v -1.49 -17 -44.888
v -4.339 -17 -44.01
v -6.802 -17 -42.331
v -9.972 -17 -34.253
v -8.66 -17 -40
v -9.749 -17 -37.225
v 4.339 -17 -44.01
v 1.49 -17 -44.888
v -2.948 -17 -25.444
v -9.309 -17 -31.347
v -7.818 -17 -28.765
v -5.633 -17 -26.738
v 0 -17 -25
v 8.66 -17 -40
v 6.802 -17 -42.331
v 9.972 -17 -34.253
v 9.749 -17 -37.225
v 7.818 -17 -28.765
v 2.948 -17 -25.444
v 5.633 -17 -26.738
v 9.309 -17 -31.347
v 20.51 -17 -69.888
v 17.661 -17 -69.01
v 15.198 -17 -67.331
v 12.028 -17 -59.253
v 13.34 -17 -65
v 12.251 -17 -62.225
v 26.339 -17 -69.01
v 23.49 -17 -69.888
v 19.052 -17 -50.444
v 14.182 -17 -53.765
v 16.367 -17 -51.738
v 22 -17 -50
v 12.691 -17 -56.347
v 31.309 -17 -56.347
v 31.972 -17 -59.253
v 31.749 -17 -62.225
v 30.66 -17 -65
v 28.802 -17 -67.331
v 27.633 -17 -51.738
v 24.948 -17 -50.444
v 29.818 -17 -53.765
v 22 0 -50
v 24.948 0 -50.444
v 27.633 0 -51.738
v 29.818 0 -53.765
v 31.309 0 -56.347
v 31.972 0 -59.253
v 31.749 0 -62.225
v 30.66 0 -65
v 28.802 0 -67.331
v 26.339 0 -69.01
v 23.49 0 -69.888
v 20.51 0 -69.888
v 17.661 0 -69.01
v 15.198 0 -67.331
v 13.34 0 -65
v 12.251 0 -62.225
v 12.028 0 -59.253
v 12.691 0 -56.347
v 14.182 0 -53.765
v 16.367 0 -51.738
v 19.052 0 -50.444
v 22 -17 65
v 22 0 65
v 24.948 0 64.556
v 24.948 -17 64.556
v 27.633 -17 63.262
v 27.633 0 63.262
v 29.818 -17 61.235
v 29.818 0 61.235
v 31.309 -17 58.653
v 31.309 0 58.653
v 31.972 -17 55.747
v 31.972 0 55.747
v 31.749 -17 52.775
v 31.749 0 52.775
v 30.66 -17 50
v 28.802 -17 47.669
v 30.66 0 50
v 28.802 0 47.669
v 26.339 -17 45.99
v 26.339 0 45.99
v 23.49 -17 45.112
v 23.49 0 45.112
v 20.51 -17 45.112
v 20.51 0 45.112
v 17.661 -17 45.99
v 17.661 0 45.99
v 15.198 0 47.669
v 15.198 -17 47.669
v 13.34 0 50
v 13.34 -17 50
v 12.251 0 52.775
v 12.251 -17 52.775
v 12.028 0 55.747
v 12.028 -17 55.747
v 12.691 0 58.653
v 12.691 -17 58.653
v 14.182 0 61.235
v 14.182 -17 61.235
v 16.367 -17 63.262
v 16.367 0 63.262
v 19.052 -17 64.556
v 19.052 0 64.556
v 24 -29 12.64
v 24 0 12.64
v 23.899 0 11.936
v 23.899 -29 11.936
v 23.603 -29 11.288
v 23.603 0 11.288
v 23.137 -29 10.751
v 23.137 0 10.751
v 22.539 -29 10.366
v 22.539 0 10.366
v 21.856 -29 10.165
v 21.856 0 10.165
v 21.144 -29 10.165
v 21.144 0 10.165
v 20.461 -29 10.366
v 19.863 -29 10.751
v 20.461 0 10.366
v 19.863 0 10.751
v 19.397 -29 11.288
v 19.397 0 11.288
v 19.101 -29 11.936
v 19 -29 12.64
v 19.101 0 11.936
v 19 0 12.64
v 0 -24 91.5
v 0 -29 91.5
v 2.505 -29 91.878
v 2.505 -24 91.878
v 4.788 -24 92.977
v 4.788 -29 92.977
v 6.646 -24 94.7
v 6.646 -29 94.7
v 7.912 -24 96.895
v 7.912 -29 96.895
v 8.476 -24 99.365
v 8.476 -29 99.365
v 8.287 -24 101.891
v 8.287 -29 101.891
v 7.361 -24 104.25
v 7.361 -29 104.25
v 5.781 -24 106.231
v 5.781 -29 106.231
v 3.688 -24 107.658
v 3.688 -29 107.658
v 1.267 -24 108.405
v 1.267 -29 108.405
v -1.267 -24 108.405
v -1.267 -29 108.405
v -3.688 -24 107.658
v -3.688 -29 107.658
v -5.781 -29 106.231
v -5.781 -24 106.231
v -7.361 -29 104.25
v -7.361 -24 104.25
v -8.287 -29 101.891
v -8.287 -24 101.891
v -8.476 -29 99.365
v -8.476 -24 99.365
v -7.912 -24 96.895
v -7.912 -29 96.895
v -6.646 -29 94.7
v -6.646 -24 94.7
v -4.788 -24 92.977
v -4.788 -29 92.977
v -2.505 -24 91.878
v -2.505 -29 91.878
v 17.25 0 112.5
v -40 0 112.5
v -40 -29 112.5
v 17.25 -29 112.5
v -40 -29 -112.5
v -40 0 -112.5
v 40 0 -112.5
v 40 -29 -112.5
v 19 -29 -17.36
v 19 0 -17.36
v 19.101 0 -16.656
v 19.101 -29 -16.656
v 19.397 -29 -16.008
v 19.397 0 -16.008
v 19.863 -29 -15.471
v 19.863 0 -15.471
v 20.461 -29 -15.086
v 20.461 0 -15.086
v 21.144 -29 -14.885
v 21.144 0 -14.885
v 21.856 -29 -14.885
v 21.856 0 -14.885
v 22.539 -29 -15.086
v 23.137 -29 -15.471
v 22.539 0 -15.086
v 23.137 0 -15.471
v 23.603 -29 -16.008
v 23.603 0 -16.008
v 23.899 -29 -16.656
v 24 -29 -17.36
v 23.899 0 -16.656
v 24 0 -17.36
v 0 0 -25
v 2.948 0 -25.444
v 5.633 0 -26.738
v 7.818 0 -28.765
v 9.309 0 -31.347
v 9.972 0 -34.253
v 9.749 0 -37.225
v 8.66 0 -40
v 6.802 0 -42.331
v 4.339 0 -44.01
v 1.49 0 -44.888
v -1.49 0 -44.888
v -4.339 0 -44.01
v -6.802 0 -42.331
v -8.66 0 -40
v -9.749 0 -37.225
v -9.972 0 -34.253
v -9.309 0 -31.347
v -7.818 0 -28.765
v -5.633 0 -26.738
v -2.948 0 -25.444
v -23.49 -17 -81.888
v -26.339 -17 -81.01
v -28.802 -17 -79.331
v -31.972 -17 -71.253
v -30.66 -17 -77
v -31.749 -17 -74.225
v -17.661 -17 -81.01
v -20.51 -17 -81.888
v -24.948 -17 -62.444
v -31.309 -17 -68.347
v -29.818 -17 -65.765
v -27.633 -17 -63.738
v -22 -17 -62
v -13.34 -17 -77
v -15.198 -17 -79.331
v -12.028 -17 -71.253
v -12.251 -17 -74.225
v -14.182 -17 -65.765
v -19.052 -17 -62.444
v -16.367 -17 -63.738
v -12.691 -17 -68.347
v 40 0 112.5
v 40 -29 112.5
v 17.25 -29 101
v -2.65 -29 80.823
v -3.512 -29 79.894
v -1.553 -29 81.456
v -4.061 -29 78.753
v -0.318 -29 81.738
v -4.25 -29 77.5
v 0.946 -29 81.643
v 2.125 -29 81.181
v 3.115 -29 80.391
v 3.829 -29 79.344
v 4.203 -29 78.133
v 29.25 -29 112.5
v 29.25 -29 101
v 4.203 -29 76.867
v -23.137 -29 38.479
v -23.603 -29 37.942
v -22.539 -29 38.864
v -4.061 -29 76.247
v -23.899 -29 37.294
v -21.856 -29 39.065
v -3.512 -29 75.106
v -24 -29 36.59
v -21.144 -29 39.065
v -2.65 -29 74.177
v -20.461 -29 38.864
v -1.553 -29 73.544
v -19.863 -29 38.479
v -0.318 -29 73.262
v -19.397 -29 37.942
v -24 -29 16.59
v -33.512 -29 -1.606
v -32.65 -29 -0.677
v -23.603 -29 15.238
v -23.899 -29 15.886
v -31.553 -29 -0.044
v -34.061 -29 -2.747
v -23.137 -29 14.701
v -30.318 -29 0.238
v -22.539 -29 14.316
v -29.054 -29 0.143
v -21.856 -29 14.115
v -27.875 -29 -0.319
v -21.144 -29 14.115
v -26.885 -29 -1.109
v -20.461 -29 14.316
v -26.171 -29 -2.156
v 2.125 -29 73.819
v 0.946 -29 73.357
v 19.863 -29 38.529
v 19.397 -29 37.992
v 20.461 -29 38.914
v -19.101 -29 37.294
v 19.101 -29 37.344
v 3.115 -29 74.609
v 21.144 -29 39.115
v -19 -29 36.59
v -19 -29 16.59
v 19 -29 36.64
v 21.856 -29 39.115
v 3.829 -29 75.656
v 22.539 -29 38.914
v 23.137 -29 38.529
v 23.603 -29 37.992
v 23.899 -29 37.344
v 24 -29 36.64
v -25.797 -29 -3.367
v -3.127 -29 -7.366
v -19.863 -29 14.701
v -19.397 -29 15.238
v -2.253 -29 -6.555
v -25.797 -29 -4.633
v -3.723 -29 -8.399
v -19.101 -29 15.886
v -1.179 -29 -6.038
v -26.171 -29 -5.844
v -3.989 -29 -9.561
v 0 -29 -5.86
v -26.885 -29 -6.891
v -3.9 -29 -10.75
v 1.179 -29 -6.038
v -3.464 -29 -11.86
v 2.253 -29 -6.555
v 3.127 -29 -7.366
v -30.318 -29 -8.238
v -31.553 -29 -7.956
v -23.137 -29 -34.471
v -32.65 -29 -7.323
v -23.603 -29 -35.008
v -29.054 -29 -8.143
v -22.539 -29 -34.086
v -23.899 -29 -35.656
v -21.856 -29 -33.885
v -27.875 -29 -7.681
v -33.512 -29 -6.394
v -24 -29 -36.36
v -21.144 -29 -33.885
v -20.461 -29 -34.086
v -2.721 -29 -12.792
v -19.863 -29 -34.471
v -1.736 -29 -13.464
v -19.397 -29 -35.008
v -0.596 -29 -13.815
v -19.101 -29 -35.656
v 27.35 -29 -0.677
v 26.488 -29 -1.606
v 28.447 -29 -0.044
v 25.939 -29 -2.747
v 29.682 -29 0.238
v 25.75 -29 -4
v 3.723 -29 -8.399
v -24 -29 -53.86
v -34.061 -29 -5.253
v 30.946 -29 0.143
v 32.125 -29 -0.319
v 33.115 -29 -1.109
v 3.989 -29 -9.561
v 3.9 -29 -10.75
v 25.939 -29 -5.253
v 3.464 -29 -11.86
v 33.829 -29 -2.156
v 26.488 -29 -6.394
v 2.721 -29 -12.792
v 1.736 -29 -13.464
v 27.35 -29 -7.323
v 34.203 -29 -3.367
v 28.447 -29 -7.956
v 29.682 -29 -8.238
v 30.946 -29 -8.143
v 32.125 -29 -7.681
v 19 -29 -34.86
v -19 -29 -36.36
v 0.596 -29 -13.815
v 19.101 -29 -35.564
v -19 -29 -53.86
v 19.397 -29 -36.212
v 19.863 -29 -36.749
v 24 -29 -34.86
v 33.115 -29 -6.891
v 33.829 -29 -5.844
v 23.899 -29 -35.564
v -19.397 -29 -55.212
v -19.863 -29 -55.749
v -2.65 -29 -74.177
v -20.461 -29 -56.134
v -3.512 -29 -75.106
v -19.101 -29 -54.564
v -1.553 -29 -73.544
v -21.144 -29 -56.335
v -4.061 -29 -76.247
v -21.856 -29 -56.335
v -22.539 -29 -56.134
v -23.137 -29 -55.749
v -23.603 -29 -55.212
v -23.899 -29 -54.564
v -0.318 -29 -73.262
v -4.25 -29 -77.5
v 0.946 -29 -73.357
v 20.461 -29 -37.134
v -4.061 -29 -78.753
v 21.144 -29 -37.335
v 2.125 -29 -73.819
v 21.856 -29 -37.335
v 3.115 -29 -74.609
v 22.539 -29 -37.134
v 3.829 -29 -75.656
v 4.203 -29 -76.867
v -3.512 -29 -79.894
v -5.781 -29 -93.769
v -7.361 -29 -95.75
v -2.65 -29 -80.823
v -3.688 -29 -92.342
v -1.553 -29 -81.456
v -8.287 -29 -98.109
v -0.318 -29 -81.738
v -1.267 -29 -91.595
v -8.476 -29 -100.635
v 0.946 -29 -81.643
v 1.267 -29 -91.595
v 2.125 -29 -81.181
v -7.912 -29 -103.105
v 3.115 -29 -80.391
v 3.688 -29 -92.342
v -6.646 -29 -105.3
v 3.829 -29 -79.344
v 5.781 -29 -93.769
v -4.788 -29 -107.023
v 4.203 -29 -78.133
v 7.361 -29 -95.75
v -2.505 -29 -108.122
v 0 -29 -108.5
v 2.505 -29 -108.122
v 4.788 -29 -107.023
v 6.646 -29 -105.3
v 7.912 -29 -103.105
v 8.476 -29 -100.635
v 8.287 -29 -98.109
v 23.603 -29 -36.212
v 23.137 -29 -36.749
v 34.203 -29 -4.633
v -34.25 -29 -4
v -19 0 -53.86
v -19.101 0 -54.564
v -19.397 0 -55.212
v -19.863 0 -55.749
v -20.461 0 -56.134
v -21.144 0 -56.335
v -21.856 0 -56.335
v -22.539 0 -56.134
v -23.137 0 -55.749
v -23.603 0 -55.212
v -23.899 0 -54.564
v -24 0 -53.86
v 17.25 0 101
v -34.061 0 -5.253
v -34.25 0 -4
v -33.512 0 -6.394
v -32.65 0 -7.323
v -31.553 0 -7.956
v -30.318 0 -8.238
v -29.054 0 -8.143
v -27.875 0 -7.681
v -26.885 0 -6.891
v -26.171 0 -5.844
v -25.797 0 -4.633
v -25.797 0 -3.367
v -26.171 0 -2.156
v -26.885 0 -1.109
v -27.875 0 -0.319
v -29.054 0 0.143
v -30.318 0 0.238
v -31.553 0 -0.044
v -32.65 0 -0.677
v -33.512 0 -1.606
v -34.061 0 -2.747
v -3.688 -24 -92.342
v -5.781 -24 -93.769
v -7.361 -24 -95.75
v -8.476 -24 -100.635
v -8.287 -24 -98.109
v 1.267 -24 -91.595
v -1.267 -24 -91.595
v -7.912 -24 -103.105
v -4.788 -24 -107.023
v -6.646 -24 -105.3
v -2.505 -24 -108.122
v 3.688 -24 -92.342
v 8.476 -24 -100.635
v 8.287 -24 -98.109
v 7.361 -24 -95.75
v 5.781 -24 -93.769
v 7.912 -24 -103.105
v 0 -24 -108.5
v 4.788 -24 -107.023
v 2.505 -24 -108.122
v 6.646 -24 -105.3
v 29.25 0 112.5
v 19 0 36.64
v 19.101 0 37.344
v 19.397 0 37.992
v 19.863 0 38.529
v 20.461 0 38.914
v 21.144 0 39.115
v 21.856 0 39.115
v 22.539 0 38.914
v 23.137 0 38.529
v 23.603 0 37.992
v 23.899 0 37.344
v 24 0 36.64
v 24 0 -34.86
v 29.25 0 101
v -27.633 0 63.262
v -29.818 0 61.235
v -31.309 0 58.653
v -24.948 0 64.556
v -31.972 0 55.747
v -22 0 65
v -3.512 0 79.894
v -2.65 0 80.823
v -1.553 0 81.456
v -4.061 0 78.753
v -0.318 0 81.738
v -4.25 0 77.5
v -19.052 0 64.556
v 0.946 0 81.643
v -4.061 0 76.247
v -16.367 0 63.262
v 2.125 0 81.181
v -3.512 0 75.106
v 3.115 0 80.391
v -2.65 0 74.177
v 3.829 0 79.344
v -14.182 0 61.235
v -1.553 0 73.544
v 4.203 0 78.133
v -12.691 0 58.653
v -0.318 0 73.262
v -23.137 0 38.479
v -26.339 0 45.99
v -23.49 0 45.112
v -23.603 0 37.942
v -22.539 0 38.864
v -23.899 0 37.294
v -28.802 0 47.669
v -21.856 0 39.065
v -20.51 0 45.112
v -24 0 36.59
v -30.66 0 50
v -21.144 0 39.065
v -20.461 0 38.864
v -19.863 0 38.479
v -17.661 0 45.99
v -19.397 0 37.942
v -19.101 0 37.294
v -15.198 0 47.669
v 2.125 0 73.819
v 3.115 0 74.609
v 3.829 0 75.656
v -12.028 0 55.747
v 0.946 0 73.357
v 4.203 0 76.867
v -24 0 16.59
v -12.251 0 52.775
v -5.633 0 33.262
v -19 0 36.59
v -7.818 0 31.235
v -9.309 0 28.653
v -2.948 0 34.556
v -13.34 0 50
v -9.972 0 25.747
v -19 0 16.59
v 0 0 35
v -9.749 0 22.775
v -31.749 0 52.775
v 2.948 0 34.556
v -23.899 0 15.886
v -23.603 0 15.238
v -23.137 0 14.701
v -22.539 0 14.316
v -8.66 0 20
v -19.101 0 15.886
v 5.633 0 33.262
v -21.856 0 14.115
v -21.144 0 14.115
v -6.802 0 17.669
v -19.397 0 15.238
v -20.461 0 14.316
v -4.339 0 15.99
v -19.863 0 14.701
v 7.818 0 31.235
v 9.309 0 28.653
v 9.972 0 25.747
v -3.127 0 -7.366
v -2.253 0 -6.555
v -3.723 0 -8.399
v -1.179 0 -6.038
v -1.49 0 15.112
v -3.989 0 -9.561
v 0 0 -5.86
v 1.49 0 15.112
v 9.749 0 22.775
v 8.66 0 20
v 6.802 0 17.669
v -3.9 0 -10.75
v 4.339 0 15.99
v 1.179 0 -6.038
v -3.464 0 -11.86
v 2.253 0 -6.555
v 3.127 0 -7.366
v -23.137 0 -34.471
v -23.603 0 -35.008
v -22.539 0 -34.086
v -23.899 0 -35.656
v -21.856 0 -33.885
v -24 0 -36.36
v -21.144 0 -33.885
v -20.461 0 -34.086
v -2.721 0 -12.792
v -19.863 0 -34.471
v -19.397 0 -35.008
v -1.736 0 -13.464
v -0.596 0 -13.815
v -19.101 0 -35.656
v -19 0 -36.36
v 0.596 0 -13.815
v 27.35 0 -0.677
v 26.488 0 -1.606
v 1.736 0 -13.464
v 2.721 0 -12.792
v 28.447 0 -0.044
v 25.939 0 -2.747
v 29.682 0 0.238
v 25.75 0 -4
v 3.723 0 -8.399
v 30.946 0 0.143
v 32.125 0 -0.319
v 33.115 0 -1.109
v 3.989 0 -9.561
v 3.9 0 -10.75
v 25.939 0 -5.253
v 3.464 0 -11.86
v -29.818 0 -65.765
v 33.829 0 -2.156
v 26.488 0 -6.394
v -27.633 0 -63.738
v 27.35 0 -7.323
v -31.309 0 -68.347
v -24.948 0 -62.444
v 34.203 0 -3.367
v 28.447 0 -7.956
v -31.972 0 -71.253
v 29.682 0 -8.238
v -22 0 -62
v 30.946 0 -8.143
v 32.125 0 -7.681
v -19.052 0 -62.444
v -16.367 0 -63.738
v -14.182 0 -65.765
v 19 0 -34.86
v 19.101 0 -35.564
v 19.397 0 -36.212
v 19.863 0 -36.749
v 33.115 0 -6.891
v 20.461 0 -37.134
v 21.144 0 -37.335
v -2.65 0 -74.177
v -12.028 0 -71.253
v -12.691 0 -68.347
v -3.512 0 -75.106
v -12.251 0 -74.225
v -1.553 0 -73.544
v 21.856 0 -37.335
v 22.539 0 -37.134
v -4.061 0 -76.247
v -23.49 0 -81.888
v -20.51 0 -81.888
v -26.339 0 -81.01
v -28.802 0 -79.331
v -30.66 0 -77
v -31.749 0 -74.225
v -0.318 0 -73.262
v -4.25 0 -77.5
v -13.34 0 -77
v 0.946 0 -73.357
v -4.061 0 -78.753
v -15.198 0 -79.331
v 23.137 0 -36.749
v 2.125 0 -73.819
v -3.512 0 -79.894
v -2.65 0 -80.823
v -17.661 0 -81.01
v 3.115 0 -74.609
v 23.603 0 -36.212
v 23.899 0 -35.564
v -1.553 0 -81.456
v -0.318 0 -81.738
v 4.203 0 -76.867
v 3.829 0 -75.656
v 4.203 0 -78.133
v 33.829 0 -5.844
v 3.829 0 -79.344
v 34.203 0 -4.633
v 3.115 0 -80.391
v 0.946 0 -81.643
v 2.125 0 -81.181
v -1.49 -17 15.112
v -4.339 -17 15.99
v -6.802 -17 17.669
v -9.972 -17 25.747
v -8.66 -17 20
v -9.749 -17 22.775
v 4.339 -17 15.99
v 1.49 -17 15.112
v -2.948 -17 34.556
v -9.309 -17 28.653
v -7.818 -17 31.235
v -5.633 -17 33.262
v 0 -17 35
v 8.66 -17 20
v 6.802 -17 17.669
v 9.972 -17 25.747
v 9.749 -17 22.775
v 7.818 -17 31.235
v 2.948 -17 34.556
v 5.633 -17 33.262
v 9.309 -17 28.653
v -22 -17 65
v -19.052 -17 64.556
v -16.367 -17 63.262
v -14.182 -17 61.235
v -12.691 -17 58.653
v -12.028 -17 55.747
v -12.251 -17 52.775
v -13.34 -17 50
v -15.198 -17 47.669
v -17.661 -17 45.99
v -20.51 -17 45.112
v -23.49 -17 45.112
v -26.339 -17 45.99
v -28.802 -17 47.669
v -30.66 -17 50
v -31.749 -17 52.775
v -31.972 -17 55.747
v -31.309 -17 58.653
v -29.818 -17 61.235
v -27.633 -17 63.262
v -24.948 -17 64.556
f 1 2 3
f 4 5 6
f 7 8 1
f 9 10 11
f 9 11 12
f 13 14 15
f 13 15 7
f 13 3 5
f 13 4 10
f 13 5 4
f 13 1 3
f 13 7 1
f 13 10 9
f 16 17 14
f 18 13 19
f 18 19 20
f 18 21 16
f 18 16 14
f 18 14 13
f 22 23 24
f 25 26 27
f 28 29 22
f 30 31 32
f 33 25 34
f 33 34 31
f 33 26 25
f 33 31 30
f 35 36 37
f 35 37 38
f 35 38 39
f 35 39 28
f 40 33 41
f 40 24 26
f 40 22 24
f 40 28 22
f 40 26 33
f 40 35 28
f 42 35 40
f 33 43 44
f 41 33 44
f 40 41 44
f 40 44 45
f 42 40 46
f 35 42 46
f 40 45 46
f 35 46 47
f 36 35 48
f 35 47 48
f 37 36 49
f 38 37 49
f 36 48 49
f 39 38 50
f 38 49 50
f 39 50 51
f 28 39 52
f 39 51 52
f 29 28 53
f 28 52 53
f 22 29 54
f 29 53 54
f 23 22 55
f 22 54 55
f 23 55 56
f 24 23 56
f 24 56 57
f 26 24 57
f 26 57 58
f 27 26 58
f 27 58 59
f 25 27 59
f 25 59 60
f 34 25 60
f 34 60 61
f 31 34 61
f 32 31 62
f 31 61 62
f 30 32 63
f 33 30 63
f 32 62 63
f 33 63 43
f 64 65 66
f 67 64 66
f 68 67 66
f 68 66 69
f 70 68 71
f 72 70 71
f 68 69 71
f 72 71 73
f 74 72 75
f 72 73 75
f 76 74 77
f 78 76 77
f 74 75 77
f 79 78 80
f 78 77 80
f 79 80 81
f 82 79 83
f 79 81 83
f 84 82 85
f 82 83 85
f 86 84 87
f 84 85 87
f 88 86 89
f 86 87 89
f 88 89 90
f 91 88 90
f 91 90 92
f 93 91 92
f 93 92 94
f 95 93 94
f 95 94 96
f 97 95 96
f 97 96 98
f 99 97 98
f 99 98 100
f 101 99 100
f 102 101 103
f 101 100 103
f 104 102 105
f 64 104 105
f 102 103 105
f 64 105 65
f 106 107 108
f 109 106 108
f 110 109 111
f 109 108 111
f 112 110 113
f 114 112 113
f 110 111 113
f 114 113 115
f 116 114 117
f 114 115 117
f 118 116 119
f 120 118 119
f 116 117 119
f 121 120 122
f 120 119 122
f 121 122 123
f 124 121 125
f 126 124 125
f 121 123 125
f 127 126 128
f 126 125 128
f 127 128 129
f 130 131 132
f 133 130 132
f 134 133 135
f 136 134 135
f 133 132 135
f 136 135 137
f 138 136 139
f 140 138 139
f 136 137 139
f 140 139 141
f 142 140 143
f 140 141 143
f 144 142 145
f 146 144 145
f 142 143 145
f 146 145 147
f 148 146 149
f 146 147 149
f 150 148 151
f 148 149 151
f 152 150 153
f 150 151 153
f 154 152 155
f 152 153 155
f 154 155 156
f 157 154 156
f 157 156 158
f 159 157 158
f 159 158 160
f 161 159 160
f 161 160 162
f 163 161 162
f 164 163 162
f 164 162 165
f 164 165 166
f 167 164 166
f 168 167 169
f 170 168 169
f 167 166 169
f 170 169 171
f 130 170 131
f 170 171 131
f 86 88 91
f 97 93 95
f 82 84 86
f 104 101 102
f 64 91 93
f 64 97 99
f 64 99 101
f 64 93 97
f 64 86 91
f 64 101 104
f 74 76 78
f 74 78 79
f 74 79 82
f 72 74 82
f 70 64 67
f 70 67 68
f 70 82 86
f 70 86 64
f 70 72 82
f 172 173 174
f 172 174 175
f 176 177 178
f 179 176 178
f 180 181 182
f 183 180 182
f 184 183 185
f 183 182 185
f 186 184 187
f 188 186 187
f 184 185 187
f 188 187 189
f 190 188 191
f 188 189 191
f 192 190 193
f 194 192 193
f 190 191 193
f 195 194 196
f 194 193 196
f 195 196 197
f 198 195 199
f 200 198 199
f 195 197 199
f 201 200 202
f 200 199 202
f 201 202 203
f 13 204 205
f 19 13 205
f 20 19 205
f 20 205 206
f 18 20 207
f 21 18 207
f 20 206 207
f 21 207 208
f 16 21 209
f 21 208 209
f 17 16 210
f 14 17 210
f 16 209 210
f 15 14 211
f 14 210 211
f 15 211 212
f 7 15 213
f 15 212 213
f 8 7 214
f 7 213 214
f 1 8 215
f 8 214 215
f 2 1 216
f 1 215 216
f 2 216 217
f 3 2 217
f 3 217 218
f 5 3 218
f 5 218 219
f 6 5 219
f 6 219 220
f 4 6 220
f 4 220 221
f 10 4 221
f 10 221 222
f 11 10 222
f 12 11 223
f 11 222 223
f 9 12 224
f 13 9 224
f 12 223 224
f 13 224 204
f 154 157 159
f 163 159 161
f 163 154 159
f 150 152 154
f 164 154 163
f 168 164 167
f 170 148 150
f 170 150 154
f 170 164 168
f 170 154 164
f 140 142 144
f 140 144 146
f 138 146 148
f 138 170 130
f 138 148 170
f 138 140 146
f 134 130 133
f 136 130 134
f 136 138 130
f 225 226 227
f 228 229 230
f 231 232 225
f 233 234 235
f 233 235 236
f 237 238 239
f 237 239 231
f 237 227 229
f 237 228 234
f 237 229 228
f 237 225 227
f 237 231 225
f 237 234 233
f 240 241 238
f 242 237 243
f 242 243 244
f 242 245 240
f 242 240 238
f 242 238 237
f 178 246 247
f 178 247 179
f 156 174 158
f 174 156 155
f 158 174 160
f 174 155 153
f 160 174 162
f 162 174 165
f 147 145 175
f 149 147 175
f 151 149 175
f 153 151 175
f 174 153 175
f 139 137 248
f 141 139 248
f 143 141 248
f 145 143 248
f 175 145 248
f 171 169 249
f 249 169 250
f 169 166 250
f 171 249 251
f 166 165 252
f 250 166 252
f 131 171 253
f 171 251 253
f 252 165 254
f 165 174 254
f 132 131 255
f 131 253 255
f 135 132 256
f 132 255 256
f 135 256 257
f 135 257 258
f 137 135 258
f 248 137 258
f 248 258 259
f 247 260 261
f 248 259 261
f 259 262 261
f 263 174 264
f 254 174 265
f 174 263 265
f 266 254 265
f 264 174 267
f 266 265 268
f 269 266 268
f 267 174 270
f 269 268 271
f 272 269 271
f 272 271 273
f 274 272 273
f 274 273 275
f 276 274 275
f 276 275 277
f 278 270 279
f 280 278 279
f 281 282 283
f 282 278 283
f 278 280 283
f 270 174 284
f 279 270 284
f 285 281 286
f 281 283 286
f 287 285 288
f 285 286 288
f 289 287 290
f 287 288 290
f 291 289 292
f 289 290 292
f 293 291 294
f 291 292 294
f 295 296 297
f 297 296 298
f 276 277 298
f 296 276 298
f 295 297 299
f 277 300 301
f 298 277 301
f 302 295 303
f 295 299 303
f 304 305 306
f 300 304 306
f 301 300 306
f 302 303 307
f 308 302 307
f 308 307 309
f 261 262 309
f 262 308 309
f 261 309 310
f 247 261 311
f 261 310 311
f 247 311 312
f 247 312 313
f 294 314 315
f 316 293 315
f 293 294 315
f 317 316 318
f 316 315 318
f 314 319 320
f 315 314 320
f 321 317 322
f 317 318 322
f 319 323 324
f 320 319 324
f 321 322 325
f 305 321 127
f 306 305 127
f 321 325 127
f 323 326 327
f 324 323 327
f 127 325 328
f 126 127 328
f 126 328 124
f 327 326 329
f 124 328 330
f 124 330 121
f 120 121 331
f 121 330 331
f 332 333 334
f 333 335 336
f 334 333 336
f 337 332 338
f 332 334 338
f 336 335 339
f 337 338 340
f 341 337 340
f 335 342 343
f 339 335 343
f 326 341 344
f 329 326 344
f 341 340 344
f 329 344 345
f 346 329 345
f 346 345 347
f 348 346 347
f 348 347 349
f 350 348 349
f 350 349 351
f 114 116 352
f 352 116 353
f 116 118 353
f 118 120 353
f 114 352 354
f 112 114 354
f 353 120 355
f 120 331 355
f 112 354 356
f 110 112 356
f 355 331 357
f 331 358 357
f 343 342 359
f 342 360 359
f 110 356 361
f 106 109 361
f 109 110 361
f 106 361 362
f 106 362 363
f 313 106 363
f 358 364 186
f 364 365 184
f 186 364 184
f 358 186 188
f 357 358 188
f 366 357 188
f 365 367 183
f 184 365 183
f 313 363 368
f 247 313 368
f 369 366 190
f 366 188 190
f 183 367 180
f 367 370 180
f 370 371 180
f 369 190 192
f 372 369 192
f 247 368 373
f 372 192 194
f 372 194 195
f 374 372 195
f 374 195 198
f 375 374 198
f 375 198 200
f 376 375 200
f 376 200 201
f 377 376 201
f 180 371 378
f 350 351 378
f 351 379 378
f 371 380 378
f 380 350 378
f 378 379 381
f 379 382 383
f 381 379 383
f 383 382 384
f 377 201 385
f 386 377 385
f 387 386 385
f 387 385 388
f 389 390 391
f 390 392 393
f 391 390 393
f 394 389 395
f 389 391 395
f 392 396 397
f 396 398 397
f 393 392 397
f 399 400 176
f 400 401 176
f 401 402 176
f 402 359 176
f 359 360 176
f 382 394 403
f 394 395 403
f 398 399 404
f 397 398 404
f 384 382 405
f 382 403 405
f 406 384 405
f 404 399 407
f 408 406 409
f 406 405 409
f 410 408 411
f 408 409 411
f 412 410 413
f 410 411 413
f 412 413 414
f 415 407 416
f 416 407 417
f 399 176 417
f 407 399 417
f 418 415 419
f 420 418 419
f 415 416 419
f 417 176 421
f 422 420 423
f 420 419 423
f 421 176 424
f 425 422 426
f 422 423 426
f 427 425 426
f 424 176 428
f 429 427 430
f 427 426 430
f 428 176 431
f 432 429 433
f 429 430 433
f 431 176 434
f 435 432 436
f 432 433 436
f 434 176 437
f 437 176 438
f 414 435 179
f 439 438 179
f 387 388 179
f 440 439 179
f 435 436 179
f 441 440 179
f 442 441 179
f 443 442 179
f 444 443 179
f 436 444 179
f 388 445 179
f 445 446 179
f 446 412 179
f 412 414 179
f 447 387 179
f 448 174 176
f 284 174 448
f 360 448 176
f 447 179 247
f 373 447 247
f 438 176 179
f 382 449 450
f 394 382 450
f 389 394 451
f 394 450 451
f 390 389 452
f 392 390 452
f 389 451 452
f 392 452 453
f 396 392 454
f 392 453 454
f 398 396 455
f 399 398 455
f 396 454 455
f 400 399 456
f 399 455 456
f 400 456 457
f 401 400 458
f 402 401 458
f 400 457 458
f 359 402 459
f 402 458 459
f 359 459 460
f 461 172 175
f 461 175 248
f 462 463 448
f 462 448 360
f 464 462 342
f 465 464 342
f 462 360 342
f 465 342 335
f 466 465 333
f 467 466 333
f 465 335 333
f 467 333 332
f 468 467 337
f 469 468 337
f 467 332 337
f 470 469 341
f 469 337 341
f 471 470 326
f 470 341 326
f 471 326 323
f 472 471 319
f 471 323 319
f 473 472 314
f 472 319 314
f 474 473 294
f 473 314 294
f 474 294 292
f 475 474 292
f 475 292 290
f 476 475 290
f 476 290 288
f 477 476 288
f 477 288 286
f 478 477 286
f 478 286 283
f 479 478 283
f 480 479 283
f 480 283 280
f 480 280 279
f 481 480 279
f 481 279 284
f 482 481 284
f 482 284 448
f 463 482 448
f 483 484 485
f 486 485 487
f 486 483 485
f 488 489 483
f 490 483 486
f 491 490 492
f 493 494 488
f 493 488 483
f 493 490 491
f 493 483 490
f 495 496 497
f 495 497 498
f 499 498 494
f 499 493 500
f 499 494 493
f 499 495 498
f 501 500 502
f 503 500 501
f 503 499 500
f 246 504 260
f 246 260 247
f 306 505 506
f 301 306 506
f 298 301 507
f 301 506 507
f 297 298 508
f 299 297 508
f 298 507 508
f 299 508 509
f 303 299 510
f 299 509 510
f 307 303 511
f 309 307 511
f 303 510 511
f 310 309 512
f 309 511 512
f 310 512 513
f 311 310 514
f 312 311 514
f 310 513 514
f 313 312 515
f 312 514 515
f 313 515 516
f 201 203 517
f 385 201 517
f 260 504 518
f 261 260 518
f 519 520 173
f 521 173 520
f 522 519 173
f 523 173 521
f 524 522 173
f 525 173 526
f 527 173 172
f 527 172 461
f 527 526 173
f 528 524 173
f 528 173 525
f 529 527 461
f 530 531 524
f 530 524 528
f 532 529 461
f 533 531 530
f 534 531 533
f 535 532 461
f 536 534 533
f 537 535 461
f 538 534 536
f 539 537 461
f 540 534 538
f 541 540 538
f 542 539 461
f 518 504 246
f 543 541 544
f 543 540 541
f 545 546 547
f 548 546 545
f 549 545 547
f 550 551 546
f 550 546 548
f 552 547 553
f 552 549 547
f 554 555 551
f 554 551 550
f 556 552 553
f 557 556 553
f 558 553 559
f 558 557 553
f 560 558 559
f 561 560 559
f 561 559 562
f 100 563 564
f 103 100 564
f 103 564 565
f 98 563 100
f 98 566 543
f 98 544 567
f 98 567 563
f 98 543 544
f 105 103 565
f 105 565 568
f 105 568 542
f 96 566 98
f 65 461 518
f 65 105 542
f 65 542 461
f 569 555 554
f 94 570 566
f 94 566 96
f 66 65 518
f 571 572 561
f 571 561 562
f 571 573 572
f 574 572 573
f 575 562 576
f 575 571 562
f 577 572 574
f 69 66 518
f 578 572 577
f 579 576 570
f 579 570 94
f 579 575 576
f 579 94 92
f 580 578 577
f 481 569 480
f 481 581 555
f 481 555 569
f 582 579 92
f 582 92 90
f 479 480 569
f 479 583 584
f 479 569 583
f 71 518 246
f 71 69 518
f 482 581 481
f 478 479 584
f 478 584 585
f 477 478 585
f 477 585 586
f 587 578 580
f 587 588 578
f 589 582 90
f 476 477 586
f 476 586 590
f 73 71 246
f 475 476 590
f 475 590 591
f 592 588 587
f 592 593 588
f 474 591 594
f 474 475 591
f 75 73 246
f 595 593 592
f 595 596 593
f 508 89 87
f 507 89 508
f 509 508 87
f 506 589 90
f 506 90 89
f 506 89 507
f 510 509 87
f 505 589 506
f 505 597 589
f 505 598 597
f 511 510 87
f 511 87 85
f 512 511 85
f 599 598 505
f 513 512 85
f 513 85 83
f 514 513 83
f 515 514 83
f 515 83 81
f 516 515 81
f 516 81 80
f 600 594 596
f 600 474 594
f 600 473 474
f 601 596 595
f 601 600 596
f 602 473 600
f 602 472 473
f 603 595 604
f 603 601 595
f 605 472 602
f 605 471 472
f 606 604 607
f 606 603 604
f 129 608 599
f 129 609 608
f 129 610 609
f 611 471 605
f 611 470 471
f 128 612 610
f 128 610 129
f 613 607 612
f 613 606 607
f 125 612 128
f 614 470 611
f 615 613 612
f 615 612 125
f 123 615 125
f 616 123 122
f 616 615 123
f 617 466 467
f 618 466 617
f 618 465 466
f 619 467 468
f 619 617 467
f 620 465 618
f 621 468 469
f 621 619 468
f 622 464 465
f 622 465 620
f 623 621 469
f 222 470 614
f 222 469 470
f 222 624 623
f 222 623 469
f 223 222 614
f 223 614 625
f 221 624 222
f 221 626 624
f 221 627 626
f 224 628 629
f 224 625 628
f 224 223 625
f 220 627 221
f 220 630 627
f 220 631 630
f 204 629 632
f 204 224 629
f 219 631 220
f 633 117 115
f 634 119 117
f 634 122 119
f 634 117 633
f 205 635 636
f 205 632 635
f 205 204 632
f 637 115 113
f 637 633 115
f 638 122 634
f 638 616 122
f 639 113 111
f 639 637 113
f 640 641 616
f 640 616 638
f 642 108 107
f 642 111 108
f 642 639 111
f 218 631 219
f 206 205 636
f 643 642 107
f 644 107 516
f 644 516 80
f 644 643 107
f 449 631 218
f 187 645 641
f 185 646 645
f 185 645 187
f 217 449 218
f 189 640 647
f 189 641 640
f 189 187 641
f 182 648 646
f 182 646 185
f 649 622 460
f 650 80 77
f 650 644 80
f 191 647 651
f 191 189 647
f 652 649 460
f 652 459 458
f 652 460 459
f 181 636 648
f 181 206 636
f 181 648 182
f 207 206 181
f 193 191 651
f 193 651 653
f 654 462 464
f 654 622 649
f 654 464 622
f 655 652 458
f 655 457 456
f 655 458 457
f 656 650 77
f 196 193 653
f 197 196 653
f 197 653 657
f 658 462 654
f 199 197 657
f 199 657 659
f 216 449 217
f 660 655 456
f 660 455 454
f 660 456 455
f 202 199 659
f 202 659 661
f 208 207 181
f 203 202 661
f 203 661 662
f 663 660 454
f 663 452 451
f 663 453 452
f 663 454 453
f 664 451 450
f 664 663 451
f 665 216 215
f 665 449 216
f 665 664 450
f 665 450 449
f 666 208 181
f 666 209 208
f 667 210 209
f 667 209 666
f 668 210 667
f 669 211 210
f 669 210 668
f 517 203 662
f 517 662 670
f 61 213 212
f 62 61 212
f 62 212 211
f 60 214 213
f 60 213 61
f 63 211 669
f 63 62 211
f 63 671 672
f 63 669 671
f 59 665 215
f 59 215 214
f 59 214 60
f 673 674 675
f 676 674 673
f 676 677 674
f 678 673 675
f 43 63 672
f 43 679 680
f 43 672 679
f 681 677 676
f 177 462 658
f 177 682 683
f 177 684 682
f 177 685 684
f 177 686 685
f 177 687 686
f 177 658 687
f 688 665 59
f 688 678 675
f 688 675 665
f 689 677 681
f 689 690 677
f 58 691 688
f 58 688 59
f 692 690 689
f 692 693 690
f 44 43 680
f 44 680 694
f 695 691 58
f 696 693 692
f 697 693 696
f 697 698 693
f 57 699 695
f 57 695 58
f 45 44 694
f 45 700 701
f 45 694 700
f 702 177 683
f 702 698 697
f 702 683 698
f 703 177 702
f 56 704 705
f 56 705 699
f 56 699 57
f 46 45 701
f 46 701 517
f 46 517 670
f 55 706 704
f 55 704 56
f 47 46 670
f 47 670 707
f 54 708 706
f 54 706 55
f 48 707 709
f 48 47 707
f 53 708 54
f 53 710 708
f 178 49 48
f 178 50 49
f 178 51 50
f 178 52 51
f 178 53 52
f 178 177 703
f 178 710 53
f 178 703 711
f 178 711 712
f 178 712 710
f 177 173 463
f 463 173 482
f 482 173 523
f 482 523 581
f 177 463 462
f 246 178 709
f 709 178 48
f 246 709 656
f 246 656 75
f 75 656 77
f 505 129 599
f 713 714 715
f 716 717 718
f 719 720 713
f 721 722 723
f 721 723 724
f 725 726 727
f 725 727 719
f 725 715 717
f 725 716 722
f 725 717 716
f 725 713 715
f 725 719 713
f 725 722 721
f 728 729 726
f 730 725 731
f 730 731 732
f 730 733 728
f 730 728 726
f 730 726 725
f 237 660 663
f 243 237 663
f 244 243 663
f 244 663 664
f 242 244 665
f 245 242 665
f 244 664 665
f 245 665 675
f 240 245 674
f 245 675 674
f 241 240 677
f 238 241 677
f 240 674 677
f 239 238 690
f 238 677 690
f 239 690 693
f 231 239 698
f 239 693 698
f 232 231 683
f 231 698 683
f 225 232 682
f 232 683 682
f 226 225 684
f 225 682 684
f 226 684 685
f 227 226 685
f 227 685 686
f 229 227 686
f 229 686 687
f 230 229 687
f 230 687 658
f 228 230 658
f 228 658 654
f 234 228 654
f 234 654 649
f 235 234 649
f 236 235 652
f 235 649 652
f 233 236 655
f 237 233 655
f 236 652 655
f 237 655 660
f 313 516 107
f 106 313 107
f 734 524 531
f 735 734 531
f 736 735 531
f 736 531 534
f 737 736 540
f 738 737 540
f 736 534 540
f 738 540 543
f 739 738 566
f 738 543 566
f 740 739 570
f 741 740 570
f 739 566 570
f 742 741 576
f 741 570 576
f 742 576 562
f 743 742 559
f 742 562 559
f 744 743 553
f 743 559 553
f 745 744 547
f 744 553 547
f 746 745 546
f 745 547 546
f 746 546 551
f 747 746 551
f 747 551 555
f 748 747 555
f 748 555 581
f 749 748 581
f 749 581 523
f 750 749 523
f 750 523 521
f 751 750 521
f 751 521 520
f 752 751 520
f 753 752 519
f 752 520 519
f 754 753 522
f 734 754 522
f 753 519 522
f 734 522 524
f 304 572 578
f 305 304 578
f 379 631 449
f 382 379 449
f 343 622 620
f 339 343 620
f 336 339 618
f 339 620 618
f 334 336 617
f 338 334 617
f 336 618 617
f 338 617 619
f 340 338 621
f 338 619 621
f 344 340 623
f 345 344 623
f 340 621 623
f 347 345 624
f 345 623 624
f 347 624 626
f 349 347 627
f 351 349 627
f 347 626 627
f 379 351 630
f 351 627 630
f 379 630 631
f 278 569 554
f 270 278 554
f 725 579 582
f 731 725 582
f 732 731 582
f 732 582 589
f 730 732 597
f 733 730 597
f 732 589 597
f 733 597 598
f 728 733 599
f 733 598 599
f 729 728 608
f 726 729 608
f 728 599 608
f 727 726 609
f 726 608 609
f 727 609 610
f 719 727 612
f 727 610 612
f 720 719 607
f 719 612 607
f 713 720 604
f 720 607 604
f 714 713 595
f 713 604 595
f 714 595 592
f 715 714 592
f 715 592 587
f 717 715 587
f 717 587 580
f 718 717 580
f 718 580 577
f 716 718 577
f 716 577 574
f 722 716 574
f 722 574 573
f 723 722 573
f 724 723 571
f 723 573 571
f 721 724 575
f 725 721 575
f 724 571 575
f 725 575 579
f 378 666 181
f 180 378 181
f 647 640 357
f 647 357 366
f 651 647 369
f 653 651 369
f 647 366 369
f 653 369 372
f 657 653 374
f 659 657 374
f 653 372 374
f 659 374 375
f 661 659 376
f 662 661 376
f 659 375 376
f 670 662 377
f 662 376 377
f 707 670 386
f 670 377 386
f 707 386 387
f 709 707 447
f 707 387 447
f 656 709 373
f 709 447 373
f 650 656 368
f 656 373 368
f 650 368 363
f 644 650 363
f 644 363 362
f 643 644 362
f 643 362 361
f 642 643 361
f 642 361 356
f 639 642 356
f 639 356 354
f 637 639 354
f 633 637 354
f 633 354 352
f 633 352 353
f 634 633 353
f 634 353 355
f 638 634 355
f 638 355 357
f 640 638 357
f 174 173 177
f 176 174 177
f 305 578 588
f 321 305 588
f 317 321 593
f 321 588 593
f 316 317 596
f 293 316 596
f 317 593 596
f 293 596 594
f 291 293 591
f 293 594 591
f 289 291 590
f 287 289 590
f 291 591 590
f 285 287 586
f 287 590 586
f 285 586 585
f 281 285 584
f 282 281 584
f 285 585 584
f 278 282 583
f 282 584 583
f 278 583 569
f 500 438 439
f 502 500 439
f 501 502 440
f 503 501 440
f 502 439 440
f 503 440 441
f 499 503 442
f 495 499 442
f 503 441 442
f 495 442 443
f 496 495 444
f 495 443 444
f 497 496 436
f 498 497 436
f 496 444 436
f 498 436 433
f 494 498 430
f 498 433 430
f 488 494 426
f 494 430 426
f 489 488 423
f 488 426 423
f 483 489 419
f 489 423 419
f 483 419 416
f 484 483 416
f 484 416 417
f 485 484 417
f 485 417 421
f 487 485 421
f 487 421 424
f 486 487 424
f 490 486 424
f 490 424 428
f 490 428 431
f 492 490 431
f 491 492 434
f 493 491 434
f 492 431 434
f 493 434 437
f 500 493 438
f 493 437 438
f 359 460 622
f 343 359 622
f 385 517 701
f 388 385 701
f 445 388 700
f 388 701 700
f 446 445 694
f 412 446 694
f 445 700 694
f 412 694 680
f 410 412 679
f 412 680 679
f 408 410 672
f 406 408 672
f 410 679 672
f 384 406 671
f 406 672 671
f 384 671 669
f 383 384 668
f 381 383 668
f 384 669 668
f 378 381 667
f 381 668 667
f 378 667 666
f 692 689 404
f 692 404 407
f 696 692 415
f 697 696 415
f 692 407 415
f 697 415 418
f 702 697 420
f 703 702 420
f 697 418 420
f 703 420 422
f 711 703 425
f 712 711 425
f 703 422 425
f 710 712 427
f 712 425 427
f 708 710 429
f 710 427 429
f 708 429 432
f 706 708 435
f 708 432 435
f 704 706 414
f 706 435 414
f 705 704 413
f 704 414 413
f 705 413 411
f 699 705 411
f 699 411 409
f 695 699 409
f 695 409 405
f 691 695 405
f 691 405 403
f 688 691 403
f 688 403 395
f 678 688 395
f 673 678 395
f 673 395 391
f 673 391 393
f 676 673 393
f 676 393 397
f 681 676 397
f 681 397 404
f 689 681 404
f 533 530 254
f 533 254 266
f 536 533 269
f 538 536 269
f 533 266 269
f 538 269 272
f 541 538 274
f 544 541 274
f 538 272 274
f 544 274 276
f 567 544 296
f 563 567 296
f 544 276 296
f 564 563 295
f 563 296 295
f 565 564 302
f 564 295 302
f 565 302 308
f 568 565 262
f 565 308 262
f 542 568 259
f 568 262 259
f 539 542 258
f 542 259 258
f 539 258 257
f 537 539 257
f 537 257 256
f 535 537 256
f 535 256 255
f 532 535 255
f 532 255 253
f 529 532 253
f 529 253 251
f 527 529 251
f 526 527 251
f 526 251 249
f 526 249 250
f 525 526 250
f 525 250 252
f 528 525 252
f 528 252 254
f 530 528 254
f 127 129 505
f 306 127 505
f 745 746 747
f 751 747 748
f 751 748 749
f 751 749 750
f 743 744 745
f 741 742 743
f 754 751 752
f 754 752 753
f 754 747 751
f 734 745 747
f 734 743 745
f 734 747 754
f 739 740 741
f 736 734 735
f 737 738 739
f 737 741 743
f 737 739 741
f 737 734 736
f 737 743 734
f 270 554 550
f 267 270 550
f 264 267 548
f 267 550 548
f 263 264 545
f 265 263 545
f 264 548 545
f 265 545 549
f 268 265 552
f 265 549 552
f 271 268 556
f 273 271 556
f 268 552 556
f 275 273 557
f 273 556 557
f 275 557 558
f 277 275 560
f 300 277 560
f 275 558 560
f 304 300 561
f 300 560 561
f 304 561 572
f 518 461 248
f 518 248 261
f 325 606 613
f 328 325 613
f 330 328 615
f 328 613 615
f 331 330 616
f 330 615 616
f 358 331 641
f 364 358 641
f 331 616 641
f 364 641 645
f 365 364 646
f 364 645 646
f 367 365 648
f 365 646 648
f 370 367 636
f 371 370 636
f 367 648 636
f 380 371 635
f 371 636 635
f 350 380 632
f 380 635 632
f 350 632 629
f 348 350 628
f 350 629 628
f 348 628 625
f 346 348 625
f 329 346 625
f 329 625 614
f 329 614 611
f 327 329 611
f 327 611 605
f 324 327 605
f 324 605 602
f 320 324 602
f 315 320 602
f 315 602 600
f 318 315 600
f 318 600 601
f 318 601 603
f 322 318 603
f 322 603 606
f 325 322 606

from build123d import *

# Parameters (mm, degrees)
SKETCH1_W           = 80
SKETCH1_H           = 225
BOSS_EXTRUDE1_DEPTH = 29
CUT_EXTRUDE1_REACH  = 124.871
SKETCH4_R           = 10
CUT_EXTRUDE2_DEPTH  = 17
SKETCH5_R           = 8.5
CUT_EXTRUDE3_DEPTH  = 5
CUT_EXTRUDE4_REACH  = 124.871
SKETCH6_W           = 12
SKETCH6_H           = 11.5
M10_TAPPED_HOLE1_D  = 8.5
CUT_EXTRUDE5_REACH  = 124.871
SKETCH10_R          = 4


with BuildPart() as part:
    # Sketch1 → Boss-Extrude1 (new body)
    with BuildSketch(Plane(origin=(0, 0, 0), x_dir=(1, 0, 0), z_dir=(0, 1, 0))):
        Rectangle(SKETCH1_W, SKETCH1_H)
    extrude(amount=-BOSS_EXTRUDE1_DEPTH)

    # Sketch2 → Cut-Extrude1 (cut, up to next)
    with BuildSketch(Plane(origin=(0, 0, 0), x_dir=(1, 0, 0), z_dir=(0, 1, 0)), mode=Mode.PRIVATE) as cut_extrude1_sk1:
        with BuildLine():
            Line((-19, 36.36), (-19, 53.86))
            ThreePointArc((-19, 53.86), (-21.5, 56.36), (-24, 53.86))
            Line((-24, 53.86), (-24, 36.36))
            ThreePointArc((-24, 36.36), (-21.5, 33.86), (-19, 36.36))
        make_face()
    cut_extrude1_tool1 = extrude(cut_extrude1_sk1.sketch, amount=-CUT_EXTRUDE1_REACH, mode=Mode.PRIVATE) & part.part
    # Sketch2 → Cut-Extrude1 (cut, up to next)
    with BuildSketch(Plane(origin=(0, 0, 0), x_dir=(1, 0, 0), z_dir=(0, 1, 0)), mode=Mode.PRIVATE) as cut_extrude1_sk2:
        with BuildLine():
            Line((-19, -36.59), (-19, -16.59))
            ThreePointArc((-19, -16.59), (-21.5, -14.09), (-24, -16.59))
            Line((-24, -16.59), (-24, -36.59))
            ThreePointArc((-24, -36.59), (-21.5, -39.09), (-19, -36.59))
        make_face()
    cut_extrude1_tool2 = extrude(cut_extrude1_sk2.sketch, amount=-CUT_EXTRUDE1_REACH, mode=Mode.PRIVATE) & part.part
    # Sketch2 → Cut-Extrude1 (cut, up to next)
    with BuildSketch(Plane(origin=(0, 0, 0), x_dir=(1, 0, 0), z_dir=(0, 1, 0)), mode=Mode.PRIVATE) as cut_extrude1_sk3:
        with BuildLine():
            Line((24, 17.36), (24, 34.86))
            ThreePointArc((24, 34.86), (21.5, 37.36), (19, 34.86))
            Line((19, 34.86), (19, 17.36))
            ThreePointArc((19, 17.36), (21.5, 14.86), (24, 17.36))
        make_face()
    cut_extrude1_tool3 = extrude(cut_extrude1_sk3.sketch, amount=-CUT_EXTRUDE1_REACH, mode=Mode.PRIVATE) & part.part
    # Sketch2 → Cut-Extrude1 (cut, up to next)
    with BuildSketch(Plane(origin=(0, 0, 0), x_dir=(1, 0, 0), z_dir=(0, 1, 0)), mode=Mode.PRIVATE) as cut_extrude1_sk4:
        with BuildLine():
            Line((24, -36.64), (24, -12.64))
            ThreePointArc((24, -12.64), (21.5, -10.14), (19, -12.64))
            Line((19, -12.64), (19, -36.64))
            ThreePointArc((19, -36.64), (21.5, -39.14), (24, -36.64))
        make_face()
    cut_extrude1_tool4 = extrude(cut_extrude1_sk4.sketch, amount=-CUT_EXTRUDE1_REACH, mode=Mode.PRIVATE) & part.part
    add(cut_extrude1_tool1.solids().sort_by_distance((-21.5, 0, -45.11))[0], mode=Mode.SUBTRACT)
    add(cut_extrude1_tool2.solids().sort_by_distance((-21.5, 0, 26.59))[0], mode=Mode.SUBTRACT)
    add(cut_extrude1_tool3.solids().sort_by_distance((21.5, 0, -26.11))[0], mode=Mode.SUBTRACT)
    add(cut_extrude1_tool4.solids().sort_by_distance((21.5, 0, 24.64))[0], mode=Mode.SUBTRACT)

    # Sketch4 → Cut-Extrude2 (cut)
    with BuildSketch(Plane(origin=(0, 0, 0), x_dir=(1, 0, 0), z_dir=(0, 1, 0))):
        with Locations(Location((-22, 72, 0), (0, 0, 270))):
            Circle(SKETCH4_R)
        with Locations(Location((22, 60, 0), (0, 0, 270))):
            Circle(SKETCH4_R)
        with Locations(Location((0, 35, 0), (0, 0, 270))):
            Circle(SKETCH4_R)
        with Locations(Location((0, -25, 0), (0, 0, 270))):
            Circle(SKETCH4_R)
        with Locations(Location((22, -55, 0), (0, 0, 270))):
            Circle(SKETCH4_R)
        with Locations(Location((-22, -55, 0), (0, 0, 270))):
            Circle(SKETCH4_R)
    extrude(amount=-CUT_EXTRUDE2_DEPTH, mode=Mode.SUBTRACT)

    # Sketch5 → Cut-Extrude3 (cut)
    with BuildSketch(Plane.XZ.offset(29)):
        with Locations(Location((0, 100, 0), (0, 0, 270))):
            Circle(SKETCH5_R)
        with Locations(Location((0, -100, 0), (0, 0, 270))):
            Circle(SKETCH5_R)
    extrude(amount=-CUT_EXTRUDE3_DEPTH, mode=Mode.SUBTRACT)

    # Sketch6 → Cut-Extrude4 (cut, up to next)
    with BuildSketch(Plane(origin=(0, 0, 0), x_dir=(1, 0, 0), z_dir=(0, 1, 0)), mode=Mode.PRIVATE) as cut_extrude4_sk1:
        with Locations((23.25, -106.75)):
            Rectangle(SKETCH6_W, SKETCH6_H)
    cut_extrude4_tool1 = extrude(cut_extrude4_sk1.sketch, amount=-CUT_EXTRUDE4_REACH, mode=Mode.PRIVATE) & part.part
    add(cut_extrude4_tool1.solids().sort_by_distance((23.25, 0, 106.75))[0], mode=Mode.SUBTRACT)

    # M10 Tapped Hole1 (through all)
    with Locations(Plane(origin=(0, 0, 0), x_dir=(1, 0, 0), z_dir=(0, 1, 0))):
        with Locations((0, -77.5), (30, 4), (-30, 4), (0, 77.5)):
            Hole(M10_TAPPED_HOLE1_D / 2)

    # Sketch10 → Cut-Extrude5 (cut, up to next)
    with BuildSketch(Plane(origin=(0, 0, 0), x_dir=(1, 0, 0), z_dir=(0, 1, 0)), mode=Mode.PRIVATE) as cut_extrude5_sk1:
        with Locations(Location((0, 9.86, 0), (0, 0, 270))):
            Circle(SKETCH10_R)
    cut_extrude5_tool1 = extrude(cut_extrude5_sk1.sketch, amount=-CUT_EXTRUDE5_REACH, mode=Mode.PRIVATE) & part.part
    add(cut_extrude5_tool1.solids().sort_by_distance((0, 0, -9.86))[0], mode=Mode.SUBTRACT)


solid = part.part
